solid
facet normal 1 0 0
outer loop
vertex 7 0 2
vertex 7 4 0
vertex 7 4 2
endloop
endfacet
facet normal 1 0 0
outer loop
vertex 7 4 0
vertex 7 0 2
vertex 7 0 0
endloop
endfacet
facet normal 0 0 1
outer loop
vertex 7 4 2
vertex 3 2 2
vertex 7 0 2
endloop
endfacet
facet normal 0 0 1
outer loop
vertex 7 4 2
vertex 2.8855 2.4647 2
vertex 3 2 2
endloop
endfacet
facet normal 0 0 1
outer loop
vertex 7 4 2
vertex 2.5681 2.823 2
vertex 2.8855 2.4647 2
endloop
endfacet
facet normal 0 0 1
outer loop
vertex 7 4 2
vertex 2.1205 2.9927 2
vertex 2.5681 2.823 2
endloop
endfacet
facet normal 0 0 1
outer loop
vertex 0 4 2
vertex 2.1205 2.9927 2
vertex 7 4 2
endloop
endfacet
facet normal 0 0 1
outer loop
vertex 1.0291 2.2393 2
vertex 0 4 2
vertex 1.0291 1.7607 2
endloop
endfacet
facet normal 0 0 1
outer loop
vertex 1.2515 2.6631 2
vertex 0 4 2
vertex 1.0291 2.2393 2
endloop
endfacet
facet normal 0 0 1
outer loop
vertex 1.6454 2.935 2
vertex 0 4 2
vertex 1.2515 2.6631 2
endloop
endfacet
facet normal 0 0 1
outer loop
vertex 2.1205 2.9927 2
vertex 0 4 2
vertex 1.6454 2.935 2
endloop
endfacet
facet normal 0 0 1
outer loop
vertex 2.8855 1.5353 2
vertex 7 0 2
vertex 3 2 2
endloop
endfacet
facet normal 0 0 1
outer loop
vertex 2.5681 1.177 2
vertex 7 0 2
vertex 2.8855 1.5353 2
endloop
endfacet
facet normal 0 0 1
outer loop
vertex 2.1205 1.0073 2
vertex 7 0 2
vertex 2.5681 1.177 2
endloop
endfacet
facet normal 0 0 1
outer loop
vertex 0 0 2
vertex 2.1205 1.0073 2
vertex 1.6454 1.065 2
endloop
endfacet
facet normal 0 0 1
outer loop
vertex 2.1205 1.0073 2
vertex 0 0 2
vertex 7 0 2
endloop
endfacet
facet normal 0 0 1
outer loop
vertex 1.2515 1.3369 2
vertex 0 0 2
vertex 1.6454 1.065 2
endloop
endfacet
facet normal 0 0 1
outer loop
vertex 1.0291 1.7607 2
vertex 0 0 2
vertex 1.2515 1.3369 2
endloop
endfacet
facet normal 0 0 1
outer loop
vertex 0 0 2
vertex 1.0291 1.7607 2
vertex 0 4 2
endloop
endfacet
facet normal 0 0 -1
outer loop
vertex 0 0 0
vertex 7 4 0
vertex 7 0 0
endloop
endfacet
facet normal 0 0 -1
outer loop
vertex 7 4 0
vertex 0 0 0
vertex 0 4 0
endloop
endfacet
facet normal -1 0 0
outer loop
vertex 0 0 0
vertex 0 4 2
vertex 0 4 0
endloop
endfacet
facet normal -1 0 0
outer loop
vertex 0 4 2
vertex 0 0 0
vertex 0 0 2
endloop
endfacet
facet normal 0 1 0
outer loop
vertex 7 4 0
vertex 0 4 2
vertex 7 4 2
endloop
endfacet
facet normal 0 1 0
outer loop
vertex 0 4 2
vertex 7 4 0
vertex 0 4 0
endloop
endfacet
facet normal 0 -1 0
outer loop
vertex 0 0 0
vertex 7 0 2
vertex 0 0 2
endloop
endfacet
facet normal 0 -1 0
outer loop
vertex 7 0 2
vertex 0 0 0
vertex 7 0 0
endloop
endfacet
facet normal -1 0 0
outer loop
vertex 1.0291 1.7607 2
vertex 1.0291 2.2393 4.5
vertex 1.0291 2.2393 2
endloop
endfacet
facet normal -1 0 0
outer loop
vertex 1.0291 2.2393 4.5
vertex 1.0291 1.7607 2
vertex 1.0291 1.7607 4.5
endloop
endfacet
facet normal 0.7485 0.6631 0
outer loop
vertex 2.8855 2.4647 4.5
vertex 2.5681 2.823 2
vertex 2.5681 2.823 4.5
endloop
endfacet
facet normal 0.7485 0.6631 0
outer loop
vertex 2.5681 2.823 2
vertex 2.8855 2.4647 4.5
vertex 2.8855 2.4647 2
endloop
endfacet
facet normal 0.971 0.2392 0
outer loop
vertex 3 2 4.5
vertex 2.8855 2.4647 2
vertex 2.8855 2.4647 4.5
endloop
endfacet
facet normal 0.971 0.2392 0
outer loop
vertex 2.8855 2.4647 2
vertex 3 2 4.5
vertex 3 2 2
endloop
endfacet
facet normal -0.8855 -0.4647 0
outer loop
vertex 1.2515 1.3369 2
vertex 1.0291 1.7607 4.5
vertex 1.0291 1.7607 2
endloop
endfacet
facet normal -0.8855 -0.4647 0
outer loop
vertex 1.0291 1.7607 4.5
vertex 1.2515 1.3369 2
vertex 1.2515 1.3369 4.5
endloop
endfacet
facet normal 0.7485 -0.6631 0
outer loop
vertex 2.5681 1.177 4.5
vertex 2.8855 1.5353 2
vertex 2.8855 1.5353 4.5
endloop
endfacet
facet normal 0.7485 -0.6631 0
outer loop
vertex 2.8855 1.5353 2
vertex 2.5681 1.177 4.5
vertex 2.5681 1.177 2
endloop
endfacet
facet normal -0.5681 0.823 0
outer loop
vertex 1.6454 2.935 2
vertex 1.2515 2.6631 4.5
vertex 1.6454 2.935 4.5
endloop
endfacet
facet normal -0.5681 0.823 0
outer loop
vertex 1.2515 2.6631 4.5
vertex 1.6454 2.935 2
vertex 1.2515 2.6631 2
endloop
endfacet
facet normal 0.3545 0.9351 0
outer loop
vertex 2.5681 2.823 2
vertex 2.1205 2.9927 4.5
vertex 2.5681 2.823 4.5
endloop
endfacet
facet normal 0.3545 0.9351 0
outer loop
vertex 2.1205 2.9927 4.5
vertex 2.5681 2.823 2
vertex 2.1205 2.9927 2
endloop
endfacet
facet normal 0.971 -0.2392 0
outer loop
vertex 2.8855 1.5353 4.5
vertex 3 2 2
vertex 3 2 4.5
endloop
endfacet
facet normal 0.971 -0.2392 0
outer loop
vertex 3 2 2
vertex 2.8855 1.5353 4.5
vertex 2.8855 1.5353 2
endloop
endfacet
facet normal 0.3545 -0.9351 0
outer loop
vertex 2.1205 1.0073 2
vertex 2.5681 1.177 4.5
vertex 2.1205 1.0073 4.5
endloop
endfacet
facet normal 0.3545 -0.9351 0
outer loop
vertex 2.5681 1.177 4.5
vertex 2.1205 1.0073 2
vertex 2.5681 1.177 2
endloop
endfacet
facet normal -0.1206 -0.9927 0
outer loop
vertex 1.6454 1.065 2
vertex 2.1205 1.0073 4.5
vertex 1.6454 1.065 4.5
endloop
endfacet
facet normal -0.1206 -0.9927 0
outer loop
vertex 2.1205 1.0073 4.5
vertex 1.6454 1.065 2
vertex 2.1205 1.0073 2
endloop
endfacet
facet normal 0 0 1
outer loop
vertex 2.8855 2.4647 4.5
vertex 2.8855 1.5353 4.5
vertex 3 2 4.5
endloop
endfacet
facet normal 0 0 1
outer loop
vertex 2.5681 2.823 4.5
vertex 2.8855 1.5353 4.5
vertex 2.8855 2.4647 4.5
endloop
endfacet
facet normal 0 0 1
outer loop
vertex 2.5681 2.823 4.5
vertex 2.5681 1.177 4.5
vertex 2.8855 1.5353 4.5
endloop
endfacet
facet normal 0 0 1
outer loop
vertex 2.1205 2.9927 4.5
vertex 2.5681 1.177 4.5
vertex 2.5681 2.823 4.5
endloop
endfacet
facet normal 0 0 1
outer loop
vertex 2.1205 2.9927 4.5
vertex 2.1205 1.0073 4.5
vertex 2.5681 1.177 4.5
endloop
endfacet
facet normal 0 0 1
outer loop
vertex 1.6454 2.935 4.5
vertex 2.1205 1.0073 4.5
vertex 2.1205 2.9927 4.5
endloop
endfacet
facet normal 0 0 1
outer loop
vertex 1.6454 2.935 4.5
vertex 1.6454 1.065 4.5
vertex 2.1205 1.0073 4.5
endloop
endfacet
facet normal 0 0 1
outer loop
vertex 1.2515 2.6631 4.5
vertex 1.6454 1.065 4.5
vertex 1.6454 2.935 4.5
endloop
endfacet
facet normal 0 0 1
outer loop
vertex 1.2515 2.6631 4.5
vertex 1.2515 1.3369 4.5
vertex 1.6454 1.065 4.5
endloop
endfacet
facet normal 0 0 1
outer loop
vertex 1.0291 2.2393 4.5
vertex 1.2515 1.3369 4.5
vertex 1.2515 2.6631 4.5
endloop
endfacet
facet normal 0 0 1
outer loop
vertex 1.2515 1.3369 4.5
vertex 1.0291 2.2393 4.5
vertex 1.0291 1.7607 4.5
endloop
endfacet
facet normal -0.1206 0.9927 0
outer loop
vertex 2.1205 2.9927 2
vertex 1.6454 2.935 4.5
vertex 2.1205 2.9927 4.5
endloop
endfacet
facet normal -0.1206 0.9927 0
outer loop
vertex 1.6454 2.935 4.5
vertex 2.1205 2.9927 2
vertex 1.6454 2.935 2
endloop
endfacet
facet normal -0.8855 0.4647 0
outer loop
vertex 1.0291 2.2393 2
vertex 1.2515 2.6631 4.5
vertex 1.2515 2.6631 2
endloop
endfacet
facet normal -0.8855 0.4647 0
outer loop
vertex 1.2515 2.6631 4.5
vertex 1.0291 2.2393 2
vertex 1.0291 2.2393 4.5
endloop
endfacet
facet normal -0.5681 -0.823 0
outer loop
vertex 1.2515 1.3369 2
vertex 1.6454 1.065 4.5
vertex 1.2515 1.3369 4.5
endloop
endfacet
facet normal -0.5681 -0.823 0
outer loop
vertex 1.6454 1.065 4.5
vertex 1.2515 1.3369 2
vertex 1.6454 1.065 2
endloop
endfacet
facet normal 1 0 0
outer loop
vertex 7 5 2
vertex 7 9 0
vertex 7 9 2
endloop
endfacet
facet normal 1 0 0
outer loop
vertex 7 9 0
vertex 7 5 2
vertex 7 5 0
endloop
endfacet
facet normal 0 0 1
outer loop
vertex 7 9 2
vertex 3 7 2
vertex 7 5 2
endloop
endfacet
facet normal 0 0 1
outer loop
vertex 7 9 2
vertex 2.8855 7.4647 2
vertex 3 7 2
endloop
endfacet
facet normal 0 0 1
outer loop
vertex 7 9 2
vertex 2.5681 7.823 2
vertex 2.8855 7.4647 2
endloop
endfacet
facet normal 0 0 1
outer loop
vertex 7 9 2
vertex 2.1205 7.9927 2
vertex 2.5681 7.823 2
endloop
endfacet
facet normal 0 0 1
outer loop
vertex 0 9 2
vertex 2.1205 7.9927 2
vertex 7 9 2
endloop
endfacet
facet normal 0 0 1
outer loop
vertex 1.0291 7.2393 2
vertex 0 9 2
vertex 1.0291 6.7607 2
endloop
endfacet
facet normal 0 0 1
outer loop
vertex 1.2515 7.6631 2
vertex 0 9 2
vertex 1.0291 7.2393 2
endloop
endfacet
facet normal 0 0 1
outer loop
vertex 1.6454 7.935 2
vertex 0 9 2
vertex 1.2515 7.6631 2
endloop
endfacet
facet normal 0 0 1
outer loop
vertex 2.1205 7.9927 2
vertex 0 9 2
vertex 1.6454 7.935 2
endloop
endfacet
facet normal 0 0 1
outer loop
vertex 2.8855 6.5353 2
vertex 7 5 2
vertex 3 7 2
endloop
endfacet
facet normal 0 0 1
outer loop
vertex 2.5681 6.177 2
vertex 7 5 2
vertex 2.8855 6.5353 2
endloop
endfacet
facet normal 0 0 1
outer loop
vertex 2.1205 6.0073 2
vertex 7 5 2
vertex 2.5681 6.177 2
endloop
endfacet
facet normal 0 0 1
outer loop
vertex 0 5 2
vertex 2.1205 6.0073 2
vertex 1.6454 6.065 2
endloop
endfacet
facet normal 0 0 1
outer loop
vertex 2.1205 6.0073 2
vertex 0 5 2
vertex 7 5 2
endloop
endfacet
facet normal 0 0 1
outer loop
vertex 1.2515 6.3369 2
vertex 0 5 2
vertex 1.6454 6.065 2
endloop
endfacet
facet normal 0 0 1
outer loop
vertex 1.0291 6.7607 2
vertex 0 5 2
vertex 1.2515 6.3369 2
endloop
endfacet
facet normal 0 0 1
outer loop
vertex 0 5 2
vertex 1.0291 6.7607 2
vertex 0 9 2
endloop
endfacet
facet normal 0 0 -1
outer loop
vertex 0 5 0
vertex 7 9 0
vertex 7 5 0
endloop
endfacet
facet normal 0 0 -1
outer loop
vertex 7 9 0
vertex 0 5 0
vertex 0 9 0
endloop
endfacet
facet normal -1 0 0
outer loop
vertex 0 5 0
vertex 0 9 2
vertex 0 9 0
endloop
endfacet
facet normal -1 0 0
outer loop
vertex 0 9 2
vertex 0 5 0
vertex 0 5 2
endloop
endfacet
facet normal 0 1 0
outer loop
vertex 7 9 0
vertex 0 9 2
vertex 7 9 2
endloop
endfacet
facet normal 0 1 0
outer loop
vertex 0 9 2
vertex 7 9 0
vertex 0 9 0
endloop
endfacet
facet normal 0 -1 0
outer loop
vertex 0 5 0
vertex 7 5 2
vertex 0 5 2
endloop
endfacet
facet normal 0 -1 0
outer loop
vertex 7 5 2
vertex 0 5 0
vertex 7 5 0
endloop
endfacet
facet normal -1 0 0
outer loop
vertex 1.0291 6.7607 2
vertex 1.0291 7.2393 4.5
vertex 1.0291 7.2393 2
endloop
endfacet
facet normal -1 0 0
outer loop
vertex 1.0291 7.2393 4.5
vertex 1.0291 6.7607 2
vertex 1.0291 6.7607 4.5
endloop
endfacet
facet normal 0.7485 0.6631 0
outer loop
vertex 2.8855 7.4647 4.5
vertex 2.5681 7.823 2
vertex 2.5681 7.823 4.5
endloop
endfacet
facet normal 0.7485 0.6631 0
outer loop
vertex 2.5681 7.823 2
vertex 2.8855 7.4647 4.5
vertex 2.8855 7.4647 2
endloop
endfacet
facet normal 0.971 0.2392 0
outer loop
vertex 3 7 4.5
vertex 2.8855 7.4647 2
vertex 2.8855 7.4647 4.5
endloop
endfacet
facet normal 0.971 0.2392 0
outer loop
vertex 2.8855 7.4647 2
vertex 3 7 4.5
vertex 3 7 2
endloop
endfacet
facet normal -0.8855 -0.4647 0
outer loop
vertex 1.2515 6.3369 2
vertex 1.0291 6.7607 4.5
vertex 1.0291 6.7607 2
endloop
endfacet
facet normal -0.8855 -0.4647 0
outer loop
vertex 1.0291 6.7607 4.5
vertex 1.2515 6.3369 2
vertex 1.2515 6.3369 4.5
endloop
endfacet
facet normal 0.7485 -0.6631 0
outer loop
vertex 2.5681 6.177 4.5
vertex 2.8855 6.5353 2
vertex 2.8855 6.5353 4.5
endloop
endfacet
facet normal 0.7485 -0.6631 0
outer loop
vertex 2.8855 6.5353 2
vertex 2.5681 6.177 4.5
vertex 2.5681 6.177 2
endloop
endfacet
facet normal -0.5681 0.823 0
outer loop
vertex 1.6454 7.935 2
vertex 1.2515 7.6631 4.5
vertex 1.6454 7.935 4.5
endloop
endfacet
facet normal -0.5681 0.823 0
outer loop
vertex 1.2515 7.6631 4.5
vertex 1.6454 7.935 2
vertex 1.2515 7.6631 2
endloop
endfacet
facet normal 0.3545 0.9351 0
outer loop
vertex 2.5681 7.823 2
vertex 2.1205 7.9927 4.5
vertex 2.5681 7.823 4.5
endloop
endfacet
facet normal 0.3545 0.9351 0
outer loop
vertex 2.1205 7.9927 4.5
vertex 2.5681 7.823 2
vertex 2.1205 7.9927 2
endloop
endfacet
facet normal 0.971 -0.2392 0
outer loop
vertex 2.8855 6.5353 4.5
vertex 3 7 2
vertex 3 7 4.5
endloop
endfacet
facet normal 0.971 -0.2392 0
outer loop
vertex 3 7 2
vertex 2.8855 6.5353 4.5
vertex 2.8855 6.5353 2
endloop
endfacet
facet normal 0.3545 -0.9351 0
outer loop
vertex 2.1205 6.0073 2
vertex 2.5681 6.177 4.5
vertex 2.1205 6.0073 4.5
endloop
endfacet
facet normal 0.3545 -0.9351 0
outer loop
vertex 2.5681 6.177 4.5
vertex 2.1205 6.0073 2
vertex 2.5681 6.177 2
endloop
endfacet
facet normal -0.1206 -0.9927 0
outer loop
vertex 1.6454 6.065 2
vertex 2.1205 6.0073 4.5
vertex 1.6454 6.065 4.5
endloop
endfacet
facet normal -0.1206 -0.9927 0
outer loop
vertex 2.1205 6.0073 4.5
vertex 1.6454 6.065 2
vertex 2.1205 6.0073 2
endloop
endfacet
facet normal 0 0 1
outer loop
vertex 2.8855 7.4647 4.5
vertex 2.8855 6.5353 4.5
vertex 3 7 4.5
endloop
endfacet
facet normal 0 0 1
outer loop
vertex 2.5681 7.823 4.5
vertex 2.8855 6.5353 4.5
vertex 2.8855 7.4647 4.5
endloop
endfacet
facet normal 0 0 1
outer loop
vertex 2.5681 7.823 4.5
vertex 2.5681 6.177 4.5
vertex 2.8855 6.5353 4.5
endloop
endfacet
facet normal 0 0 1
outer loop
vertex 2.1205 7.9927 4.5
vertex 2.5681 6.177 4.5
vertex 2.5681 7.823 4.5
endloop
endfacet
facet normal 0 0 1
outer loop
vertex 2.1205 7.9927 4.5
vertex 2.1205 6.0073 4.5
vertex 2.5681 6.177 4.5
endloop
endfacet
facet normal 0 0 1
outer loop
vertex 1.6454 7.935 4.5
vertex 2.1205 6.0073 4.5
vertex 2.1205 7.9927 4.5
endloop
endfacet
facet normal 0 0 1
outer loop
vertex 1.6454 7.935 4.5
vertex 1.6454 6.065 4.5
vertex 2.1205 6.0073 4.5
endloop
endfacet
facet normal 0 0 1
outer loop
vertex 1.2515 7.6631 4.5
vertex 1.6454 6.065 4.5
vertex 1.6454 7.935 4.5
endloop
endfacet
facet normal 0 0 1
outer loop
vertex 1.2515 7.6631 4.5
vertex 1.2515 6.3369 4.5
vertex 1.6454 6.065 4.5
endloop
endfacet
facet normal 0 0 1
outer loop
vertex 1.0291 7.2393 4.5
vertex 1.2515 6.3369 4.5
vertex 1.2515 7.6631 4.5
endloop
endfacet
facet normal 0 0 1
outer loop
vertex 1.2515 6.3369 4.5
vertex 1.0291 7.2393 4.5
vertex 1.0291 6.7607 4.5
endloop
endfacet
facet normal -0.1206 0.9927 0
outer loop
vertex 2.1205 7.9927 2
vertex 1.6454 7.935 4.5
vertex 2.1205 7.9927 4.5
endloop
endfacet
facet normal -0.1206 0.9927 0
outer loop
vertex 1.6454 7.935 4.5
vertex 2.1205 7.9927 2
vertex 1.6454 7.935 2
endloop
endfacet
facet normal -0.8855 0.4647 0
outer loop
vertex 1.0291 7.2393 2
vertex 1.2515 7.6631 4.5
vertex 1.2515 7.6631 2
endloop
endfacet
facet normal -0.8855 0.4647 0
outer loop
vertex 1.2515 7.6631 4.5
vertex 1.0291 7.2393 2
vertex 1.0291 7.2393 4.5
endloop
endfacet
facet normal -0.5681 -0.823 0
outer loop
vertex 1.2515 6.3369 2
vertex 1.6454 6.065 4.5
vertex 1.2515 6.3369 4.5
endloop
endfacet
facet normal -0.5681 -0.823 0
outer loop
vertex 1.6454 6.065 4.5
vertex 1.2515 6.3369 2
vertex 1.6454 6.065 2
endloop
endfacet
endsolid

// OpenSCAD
$fa=.5;$fs=.5;
module a(){
	cube([7,4,2]);
	translate([2,2,2])cylinder(d=2,h=2.5);
}
a();
translate([0,5,0])a();
